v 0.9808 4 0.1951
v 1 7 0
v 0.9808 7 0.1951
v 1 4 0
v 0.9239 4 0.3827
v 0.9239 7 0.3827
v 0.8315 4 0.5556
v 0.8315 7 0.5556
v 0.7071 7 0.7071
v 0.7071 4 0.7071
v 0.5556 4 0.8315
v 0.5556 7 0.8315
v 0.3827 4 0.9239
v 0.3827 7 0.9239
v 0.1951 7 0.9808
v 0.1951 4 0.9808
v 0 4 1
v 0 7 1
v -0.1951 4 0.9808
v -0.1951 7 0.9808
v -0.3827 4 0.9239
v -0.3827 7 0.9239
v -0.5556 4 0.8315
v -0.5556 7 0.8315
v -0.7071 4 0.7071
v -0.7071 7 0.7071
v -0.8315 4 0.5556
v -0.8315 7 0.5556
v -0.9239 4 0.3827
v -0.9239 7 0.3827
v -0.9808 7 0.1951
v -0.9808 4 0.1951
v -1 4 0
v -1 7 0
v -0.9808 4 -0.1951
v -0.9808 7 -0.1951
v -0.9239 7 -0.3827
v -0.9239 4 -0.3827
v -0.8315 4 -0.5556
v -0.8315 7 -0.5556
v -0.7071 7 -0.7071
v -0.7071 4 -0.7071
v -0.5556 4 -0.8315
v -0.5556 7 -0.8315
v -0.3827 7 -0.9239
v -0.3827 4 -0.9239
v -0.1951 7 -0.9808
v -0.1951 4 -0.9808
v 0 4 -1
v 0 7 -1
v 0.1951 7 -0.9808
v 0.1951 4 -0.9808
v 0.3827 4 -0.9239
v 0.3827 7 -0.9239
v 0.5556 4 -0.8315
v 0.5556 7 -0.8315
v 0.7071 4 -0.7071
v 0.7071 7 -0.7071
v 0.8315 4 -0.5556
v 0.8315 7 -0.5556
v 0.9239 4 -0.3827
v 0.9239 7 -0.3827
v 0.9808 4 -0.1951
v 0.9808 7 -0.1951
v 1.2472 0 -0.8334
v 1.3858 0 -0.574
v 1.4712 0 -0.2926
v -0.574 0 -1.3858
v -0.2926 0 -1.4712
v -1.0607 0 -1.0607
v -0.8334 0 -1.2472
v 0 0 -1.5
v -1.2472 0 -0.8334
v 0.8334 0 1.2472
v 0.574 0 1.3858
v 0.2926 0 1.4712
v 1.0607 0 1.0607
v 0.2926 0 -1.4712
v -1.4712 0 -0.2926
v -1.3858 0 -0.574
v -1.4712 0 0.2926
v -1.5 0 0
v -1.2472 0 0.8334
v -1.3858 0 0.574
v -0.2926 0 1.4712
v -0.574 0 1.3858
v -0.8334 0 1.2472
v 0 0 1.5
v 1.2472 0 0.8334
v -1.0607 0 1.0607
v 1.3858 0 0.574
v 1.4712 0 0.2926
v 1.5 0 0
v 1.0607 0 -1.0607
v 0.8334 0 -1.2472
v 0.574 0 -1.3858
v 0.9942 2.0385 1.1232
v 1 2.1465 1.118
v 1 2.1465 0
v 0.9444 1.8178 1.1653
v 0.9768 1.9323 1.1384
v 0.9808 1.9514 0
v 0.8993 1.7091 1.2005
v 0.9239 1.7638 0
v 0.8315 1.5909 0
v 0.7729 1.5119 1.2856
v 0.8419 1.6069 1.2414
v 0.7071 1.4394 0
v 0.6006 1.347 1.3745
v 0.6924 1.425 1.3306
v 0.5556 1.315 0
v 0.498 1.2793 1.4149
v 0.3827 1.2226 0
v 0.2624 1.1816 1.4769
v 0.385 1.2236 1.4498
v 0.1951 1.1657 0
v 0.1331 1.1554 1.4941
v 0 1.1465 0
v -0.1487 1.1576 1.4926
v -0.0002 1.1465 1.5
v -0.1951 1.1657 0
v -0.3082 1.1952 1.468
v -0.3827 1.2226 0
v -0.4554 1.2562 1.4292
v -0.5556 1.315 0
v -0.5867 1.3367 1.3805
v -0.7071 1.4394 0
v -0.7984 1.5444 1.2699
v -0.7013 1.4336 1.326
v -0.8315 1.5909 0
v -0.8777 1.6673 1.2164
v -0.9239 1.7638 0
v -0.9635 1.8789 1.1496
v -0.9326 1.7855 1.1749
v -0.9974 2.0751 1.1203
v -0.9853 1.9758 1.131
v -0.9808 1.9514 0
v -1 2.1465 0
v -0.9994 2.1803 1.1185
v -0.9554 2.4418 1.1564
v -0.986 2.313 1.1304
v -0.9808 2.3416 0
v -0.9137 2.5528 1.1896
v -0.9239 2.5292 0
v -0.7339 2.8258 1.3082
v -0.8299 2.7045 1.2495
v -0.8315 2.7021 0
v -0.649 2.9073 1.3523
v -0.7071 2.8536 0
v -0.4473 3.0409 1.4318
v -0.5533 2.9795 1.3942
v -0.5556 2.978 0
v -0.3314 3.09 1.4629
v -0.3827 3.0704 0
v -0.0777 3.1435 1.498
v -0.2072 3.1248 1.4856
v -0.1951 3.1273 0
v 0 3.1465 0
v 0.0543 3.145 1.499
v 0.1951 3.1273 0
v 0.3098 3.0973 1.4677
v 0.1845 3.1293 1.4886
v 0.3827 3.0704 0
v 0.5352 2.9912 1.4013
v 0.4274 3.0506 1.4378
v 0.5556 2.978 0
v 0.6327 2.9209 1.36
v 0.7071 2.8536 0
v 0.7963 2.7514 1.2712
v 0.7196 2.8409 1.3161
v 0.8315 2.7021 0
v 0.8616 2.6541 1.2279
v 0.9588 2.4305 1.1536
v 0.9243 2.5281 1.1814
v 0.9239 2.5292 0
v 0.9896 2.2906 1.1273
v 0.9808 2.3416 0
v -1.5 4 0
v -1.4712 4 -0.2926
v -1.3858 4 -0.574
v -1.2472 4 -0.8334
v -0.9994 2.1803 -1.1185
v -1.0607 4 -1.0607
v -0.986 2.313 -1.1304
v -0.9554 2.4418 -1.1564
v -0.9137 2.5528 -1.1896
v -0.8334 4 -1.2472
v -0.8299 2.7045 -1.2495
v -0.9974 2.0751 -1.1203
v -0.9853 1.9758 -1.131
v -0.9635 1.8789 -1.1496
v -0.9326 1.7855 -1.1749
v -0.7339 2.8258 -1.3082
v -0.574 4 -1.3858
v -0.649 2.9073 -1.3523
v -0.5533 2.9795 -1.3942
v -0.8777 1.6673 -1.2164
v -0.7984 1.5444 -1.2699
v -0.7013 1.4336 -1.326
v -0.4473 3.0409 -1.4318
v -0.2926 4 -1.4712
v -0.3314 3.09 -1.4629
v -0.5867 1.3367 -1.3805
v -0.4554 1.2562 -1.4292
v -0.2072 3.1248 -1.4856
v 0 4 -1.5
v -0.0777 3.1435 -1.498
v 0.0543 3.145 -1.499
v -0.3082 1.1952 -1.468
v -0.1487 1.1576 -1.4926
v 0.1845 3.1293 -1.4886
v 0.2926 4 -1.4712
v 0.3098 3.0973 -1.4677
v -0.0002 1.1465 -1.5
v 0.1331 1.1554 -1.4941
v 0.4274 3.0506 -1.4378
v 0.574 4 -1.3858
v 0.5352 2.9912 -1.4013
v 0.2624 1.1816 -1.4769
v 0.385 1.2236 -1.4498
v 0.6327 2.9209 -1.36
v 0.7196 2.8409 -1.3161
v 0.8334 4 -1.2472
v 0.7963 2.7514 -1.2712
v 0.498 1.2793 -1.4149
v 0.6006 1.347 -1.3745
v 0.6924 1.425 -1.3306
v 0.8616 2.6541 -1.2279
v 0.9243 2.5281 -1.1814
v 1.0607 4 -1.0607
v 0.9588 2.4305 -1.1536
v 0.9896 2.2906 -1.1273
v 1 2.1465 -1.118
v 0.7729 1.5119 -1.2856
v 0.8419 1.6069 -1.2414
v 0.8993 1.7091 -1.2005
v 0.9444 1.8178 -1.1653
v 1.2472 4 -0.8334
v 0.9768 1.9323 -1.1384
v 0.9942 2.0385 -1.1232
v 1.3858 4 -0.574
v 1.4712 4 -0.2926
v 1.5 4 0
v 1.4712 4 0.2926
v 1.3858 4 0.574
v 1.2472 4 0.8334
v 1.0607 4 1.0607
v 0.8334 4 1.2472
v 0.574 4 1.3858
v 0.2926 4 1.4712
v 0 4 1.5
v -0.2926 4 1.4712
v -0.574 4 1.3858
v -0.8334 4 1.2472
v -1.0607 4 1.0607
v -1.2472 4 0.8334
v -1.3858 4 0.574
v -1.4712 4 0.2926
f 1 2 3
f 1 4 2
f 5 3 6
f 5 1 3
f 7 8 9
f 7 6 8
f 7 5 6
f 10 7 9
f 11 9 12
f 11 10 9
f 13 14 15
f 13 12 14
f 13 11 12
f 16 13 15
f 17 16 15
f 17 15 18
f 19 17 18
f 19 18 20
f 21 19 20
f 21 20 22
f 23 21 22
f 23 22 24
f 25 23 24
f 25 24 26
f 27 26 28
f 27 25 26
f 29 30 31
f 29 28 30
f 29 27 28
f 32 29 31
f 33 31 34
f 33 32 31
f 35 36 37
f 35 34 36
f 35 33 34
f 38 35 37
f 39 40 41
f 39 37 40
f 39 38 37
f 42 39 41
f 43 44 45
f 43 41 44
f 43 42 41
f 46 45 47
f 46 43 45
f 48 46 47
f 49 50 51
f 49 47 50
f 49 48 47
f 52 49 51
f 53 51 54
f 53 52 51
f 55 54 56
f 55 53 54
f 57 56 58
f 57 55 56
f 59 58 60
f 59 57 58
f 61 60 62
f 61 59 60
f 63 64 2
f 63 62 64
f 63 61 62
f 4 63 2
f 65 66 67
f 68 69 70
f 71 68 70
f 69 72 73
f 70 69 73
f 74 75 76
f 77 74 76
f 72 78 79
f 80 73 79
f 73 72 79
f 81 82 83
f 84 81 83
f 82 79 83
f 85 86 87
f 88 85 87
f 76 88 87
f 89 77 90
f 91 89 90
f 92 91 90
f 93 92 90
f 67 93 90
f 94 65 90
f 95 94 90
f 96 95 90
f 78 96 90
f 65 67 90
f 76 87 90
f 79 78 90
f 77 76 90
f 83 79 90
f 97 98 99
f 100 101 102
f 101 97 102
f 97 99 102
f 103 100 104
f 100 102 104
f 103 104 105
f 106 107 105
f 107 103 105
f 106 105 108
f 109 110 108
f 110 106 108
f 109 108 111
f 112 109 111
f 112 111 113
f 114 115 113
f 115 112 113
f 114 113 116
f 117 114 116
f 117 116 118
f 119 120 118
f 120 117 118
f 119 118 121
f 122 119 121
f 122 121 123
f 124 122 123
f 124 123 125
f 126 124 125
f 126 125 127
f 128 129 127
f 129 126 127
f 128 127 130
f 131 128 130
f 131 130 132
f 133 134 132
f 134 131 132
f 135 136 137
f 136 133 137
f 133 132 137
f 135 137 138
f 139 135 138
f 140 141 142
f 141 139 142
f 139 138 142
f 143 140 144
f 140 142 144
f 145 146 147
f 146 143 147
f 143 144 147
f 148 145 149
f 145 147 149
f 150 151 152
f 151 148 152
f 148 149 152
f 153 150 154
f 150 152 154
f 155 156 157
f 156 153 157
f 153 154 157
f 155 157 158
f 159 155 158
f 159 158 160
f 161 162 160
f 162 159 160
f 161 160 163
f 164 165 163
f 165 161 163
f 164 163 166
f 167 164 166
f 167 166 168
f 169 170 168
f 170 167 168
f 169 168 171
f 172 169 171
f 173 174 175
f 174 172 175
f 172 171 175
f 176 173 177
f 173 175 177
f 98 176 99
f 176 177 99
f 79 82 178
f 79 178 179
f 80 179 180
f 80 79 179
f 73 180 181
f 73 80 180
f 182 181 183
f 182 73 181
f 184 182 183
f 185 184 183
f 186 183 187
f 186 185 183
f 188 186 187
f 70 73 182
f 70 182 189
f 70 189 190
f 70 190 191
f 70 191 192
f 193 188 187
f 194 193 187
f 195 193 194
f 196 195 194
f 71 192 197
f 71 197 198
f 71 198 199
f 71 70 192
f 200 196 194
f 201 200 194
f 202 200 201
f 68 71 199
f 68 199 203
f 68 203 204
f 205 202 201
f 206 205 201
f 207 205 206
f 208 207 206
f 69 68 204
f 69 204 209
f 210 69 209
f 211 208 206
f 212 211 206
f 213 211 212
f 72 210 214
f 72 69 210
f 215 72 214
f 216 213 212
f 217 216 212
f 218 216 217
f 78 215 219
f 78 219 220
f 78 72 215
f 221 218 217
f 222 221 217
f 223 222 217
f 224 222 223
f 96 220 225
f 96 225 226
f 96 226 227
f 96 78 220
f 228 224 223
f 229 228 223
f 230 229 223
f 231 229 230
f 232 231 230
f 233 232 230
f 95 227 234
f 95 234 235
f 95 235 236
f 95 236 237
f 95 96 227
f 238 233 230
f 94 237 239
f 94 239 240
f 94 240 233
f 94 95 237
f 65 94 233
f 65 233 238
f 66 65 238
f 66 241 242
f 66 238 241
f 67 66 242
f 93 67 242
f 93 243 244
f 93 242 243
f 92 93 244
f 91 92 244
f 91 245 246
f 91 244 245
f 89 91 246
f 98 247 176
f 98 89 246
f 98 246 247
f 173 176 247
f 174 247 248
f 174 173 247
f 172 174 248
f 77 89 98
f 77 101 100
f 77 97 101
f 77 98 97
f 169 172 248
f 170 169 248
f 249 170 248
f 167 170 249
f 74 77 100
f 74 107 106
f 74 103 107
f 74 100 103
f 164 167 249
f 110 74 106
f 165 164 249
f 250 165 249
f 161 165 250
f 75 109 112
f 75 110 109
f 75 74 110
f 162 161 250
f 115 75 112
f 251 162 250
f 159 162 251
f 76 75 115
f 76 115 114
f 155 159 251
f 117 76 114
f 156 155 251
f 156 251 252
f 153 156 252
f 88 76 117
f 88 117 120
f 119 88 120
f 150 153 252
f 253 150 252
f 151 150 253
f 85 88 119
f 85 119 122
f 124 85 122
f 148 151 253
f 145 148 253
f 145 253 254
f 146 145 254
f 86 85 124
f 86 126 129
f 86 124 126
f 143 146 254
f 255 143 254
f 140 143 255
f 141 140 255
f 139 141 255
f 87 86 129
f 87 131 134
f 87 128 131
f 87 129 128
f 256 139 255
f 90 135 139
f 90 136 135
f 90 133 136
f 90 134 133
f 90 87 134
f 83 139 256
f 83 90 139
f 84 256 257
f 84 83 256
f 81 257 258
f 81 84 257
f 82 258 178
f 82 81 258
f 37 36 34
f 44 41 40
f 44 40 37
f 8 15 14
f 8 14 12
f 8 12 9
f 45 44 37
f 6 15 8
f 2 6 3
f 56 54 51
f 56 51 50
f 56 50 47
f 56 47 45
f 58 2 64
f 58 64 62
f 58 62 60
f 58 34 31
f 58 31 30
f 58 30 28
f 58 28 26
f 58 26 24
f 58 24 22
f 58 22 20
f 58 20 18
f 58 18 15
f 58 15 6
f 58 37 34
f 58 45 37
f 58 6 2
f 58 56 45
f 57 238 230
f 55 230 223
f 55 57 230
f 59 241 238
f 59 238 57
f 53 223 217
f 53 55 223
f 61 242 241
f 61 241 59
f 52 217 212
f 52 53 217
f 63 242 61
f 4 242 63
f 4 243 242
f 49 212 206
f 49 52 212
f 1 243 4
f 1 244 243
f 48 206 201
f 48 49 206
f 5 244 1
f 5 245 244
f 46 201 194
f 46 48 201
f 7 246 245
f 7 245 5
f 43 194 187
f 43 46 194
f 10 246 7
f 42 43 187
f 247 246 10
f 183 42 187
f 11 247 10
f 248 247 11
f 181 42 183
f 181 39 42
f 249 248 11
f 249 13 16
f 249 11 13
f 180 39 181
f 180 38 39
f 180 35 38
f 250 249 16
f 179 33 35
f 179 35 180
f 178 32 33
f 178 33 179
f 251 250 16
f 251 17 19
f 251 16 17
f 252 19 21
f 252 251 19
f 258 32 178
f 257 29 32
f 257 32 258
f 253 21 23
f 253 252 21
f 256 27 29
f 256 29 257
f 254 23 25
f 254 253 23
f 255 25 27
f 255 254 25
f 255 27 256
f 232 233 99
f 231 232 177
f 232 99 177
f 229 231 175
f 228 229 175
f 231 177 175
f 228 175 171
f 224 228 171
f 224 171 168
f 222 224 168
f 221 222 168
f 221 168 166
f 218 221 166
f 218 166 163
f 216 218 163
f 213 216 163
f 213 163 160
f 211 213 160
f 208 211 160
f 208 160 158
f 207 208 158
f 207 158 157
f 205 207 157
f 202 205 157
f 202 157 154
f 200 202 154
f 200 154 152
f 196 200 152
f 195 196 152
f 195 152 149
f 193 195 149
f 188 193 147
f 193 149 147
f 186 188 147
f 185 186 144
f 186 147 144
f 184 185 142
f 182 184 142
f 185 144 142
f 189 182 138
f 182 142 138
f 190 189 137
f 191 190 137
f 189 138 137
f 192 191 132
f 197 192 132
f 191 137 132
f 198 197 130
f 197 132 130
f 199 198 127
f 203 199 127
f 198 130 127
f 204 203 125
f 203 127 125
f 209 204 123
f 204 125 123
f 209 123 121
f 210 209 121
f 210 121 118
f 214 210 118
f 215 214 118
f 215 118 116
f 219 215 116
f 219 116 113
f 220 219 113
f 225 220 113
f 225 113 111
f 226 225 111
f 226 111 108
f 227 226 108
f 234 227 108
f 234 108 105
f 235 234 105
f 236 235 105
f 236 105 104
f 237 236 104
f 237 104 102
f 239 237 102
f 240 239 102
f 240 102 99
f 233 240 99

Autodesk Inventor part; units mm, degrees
ref_plane "YZ Plane" through (0, 0, 0) normal (1, 0, 0) x (0, 1, 0)
ref_plane "XZ Plane" through (0, 0, 0) normal (0, 1, 0) x (-1, 0, 0)
ref_plane "XY Plane" through (0, 0, 0) normal (0, 0, 1) x (1, 0, 0)
sketch "Skizze1" plane through (0, 0, 0) normal (0, 1, 0) x (-1, 0, 0)
  circle A0 centre (0, 0) radius 1.5
  dimension "d0" = 3
extrude "Extrusion1" add sketch "Skizze1" along normal blind 4
sketch "Skizze2" plane through (0, 4, 0) normal (0, 1, 0) x (1, 0, 0)
  circle A0 centre (0, 0) radius 1
  dimension "d3" = 2
extrude "Extrusion2" add sketch "Skizze2" along normal blind 3
sketch "Skizze3" plane through (0, 0, 0) normal (0, 0, 1) x (1, 0, 0)
  circle A0 centre (0, 2.1465) radius 1
  point P0 (0, 0)
  dimension "d6" = 2
extrude "Extrusion3" cut sketch "Skizze3" along normal mid plane 6
properties part number "P_Servo_SIMPROP_ex"
